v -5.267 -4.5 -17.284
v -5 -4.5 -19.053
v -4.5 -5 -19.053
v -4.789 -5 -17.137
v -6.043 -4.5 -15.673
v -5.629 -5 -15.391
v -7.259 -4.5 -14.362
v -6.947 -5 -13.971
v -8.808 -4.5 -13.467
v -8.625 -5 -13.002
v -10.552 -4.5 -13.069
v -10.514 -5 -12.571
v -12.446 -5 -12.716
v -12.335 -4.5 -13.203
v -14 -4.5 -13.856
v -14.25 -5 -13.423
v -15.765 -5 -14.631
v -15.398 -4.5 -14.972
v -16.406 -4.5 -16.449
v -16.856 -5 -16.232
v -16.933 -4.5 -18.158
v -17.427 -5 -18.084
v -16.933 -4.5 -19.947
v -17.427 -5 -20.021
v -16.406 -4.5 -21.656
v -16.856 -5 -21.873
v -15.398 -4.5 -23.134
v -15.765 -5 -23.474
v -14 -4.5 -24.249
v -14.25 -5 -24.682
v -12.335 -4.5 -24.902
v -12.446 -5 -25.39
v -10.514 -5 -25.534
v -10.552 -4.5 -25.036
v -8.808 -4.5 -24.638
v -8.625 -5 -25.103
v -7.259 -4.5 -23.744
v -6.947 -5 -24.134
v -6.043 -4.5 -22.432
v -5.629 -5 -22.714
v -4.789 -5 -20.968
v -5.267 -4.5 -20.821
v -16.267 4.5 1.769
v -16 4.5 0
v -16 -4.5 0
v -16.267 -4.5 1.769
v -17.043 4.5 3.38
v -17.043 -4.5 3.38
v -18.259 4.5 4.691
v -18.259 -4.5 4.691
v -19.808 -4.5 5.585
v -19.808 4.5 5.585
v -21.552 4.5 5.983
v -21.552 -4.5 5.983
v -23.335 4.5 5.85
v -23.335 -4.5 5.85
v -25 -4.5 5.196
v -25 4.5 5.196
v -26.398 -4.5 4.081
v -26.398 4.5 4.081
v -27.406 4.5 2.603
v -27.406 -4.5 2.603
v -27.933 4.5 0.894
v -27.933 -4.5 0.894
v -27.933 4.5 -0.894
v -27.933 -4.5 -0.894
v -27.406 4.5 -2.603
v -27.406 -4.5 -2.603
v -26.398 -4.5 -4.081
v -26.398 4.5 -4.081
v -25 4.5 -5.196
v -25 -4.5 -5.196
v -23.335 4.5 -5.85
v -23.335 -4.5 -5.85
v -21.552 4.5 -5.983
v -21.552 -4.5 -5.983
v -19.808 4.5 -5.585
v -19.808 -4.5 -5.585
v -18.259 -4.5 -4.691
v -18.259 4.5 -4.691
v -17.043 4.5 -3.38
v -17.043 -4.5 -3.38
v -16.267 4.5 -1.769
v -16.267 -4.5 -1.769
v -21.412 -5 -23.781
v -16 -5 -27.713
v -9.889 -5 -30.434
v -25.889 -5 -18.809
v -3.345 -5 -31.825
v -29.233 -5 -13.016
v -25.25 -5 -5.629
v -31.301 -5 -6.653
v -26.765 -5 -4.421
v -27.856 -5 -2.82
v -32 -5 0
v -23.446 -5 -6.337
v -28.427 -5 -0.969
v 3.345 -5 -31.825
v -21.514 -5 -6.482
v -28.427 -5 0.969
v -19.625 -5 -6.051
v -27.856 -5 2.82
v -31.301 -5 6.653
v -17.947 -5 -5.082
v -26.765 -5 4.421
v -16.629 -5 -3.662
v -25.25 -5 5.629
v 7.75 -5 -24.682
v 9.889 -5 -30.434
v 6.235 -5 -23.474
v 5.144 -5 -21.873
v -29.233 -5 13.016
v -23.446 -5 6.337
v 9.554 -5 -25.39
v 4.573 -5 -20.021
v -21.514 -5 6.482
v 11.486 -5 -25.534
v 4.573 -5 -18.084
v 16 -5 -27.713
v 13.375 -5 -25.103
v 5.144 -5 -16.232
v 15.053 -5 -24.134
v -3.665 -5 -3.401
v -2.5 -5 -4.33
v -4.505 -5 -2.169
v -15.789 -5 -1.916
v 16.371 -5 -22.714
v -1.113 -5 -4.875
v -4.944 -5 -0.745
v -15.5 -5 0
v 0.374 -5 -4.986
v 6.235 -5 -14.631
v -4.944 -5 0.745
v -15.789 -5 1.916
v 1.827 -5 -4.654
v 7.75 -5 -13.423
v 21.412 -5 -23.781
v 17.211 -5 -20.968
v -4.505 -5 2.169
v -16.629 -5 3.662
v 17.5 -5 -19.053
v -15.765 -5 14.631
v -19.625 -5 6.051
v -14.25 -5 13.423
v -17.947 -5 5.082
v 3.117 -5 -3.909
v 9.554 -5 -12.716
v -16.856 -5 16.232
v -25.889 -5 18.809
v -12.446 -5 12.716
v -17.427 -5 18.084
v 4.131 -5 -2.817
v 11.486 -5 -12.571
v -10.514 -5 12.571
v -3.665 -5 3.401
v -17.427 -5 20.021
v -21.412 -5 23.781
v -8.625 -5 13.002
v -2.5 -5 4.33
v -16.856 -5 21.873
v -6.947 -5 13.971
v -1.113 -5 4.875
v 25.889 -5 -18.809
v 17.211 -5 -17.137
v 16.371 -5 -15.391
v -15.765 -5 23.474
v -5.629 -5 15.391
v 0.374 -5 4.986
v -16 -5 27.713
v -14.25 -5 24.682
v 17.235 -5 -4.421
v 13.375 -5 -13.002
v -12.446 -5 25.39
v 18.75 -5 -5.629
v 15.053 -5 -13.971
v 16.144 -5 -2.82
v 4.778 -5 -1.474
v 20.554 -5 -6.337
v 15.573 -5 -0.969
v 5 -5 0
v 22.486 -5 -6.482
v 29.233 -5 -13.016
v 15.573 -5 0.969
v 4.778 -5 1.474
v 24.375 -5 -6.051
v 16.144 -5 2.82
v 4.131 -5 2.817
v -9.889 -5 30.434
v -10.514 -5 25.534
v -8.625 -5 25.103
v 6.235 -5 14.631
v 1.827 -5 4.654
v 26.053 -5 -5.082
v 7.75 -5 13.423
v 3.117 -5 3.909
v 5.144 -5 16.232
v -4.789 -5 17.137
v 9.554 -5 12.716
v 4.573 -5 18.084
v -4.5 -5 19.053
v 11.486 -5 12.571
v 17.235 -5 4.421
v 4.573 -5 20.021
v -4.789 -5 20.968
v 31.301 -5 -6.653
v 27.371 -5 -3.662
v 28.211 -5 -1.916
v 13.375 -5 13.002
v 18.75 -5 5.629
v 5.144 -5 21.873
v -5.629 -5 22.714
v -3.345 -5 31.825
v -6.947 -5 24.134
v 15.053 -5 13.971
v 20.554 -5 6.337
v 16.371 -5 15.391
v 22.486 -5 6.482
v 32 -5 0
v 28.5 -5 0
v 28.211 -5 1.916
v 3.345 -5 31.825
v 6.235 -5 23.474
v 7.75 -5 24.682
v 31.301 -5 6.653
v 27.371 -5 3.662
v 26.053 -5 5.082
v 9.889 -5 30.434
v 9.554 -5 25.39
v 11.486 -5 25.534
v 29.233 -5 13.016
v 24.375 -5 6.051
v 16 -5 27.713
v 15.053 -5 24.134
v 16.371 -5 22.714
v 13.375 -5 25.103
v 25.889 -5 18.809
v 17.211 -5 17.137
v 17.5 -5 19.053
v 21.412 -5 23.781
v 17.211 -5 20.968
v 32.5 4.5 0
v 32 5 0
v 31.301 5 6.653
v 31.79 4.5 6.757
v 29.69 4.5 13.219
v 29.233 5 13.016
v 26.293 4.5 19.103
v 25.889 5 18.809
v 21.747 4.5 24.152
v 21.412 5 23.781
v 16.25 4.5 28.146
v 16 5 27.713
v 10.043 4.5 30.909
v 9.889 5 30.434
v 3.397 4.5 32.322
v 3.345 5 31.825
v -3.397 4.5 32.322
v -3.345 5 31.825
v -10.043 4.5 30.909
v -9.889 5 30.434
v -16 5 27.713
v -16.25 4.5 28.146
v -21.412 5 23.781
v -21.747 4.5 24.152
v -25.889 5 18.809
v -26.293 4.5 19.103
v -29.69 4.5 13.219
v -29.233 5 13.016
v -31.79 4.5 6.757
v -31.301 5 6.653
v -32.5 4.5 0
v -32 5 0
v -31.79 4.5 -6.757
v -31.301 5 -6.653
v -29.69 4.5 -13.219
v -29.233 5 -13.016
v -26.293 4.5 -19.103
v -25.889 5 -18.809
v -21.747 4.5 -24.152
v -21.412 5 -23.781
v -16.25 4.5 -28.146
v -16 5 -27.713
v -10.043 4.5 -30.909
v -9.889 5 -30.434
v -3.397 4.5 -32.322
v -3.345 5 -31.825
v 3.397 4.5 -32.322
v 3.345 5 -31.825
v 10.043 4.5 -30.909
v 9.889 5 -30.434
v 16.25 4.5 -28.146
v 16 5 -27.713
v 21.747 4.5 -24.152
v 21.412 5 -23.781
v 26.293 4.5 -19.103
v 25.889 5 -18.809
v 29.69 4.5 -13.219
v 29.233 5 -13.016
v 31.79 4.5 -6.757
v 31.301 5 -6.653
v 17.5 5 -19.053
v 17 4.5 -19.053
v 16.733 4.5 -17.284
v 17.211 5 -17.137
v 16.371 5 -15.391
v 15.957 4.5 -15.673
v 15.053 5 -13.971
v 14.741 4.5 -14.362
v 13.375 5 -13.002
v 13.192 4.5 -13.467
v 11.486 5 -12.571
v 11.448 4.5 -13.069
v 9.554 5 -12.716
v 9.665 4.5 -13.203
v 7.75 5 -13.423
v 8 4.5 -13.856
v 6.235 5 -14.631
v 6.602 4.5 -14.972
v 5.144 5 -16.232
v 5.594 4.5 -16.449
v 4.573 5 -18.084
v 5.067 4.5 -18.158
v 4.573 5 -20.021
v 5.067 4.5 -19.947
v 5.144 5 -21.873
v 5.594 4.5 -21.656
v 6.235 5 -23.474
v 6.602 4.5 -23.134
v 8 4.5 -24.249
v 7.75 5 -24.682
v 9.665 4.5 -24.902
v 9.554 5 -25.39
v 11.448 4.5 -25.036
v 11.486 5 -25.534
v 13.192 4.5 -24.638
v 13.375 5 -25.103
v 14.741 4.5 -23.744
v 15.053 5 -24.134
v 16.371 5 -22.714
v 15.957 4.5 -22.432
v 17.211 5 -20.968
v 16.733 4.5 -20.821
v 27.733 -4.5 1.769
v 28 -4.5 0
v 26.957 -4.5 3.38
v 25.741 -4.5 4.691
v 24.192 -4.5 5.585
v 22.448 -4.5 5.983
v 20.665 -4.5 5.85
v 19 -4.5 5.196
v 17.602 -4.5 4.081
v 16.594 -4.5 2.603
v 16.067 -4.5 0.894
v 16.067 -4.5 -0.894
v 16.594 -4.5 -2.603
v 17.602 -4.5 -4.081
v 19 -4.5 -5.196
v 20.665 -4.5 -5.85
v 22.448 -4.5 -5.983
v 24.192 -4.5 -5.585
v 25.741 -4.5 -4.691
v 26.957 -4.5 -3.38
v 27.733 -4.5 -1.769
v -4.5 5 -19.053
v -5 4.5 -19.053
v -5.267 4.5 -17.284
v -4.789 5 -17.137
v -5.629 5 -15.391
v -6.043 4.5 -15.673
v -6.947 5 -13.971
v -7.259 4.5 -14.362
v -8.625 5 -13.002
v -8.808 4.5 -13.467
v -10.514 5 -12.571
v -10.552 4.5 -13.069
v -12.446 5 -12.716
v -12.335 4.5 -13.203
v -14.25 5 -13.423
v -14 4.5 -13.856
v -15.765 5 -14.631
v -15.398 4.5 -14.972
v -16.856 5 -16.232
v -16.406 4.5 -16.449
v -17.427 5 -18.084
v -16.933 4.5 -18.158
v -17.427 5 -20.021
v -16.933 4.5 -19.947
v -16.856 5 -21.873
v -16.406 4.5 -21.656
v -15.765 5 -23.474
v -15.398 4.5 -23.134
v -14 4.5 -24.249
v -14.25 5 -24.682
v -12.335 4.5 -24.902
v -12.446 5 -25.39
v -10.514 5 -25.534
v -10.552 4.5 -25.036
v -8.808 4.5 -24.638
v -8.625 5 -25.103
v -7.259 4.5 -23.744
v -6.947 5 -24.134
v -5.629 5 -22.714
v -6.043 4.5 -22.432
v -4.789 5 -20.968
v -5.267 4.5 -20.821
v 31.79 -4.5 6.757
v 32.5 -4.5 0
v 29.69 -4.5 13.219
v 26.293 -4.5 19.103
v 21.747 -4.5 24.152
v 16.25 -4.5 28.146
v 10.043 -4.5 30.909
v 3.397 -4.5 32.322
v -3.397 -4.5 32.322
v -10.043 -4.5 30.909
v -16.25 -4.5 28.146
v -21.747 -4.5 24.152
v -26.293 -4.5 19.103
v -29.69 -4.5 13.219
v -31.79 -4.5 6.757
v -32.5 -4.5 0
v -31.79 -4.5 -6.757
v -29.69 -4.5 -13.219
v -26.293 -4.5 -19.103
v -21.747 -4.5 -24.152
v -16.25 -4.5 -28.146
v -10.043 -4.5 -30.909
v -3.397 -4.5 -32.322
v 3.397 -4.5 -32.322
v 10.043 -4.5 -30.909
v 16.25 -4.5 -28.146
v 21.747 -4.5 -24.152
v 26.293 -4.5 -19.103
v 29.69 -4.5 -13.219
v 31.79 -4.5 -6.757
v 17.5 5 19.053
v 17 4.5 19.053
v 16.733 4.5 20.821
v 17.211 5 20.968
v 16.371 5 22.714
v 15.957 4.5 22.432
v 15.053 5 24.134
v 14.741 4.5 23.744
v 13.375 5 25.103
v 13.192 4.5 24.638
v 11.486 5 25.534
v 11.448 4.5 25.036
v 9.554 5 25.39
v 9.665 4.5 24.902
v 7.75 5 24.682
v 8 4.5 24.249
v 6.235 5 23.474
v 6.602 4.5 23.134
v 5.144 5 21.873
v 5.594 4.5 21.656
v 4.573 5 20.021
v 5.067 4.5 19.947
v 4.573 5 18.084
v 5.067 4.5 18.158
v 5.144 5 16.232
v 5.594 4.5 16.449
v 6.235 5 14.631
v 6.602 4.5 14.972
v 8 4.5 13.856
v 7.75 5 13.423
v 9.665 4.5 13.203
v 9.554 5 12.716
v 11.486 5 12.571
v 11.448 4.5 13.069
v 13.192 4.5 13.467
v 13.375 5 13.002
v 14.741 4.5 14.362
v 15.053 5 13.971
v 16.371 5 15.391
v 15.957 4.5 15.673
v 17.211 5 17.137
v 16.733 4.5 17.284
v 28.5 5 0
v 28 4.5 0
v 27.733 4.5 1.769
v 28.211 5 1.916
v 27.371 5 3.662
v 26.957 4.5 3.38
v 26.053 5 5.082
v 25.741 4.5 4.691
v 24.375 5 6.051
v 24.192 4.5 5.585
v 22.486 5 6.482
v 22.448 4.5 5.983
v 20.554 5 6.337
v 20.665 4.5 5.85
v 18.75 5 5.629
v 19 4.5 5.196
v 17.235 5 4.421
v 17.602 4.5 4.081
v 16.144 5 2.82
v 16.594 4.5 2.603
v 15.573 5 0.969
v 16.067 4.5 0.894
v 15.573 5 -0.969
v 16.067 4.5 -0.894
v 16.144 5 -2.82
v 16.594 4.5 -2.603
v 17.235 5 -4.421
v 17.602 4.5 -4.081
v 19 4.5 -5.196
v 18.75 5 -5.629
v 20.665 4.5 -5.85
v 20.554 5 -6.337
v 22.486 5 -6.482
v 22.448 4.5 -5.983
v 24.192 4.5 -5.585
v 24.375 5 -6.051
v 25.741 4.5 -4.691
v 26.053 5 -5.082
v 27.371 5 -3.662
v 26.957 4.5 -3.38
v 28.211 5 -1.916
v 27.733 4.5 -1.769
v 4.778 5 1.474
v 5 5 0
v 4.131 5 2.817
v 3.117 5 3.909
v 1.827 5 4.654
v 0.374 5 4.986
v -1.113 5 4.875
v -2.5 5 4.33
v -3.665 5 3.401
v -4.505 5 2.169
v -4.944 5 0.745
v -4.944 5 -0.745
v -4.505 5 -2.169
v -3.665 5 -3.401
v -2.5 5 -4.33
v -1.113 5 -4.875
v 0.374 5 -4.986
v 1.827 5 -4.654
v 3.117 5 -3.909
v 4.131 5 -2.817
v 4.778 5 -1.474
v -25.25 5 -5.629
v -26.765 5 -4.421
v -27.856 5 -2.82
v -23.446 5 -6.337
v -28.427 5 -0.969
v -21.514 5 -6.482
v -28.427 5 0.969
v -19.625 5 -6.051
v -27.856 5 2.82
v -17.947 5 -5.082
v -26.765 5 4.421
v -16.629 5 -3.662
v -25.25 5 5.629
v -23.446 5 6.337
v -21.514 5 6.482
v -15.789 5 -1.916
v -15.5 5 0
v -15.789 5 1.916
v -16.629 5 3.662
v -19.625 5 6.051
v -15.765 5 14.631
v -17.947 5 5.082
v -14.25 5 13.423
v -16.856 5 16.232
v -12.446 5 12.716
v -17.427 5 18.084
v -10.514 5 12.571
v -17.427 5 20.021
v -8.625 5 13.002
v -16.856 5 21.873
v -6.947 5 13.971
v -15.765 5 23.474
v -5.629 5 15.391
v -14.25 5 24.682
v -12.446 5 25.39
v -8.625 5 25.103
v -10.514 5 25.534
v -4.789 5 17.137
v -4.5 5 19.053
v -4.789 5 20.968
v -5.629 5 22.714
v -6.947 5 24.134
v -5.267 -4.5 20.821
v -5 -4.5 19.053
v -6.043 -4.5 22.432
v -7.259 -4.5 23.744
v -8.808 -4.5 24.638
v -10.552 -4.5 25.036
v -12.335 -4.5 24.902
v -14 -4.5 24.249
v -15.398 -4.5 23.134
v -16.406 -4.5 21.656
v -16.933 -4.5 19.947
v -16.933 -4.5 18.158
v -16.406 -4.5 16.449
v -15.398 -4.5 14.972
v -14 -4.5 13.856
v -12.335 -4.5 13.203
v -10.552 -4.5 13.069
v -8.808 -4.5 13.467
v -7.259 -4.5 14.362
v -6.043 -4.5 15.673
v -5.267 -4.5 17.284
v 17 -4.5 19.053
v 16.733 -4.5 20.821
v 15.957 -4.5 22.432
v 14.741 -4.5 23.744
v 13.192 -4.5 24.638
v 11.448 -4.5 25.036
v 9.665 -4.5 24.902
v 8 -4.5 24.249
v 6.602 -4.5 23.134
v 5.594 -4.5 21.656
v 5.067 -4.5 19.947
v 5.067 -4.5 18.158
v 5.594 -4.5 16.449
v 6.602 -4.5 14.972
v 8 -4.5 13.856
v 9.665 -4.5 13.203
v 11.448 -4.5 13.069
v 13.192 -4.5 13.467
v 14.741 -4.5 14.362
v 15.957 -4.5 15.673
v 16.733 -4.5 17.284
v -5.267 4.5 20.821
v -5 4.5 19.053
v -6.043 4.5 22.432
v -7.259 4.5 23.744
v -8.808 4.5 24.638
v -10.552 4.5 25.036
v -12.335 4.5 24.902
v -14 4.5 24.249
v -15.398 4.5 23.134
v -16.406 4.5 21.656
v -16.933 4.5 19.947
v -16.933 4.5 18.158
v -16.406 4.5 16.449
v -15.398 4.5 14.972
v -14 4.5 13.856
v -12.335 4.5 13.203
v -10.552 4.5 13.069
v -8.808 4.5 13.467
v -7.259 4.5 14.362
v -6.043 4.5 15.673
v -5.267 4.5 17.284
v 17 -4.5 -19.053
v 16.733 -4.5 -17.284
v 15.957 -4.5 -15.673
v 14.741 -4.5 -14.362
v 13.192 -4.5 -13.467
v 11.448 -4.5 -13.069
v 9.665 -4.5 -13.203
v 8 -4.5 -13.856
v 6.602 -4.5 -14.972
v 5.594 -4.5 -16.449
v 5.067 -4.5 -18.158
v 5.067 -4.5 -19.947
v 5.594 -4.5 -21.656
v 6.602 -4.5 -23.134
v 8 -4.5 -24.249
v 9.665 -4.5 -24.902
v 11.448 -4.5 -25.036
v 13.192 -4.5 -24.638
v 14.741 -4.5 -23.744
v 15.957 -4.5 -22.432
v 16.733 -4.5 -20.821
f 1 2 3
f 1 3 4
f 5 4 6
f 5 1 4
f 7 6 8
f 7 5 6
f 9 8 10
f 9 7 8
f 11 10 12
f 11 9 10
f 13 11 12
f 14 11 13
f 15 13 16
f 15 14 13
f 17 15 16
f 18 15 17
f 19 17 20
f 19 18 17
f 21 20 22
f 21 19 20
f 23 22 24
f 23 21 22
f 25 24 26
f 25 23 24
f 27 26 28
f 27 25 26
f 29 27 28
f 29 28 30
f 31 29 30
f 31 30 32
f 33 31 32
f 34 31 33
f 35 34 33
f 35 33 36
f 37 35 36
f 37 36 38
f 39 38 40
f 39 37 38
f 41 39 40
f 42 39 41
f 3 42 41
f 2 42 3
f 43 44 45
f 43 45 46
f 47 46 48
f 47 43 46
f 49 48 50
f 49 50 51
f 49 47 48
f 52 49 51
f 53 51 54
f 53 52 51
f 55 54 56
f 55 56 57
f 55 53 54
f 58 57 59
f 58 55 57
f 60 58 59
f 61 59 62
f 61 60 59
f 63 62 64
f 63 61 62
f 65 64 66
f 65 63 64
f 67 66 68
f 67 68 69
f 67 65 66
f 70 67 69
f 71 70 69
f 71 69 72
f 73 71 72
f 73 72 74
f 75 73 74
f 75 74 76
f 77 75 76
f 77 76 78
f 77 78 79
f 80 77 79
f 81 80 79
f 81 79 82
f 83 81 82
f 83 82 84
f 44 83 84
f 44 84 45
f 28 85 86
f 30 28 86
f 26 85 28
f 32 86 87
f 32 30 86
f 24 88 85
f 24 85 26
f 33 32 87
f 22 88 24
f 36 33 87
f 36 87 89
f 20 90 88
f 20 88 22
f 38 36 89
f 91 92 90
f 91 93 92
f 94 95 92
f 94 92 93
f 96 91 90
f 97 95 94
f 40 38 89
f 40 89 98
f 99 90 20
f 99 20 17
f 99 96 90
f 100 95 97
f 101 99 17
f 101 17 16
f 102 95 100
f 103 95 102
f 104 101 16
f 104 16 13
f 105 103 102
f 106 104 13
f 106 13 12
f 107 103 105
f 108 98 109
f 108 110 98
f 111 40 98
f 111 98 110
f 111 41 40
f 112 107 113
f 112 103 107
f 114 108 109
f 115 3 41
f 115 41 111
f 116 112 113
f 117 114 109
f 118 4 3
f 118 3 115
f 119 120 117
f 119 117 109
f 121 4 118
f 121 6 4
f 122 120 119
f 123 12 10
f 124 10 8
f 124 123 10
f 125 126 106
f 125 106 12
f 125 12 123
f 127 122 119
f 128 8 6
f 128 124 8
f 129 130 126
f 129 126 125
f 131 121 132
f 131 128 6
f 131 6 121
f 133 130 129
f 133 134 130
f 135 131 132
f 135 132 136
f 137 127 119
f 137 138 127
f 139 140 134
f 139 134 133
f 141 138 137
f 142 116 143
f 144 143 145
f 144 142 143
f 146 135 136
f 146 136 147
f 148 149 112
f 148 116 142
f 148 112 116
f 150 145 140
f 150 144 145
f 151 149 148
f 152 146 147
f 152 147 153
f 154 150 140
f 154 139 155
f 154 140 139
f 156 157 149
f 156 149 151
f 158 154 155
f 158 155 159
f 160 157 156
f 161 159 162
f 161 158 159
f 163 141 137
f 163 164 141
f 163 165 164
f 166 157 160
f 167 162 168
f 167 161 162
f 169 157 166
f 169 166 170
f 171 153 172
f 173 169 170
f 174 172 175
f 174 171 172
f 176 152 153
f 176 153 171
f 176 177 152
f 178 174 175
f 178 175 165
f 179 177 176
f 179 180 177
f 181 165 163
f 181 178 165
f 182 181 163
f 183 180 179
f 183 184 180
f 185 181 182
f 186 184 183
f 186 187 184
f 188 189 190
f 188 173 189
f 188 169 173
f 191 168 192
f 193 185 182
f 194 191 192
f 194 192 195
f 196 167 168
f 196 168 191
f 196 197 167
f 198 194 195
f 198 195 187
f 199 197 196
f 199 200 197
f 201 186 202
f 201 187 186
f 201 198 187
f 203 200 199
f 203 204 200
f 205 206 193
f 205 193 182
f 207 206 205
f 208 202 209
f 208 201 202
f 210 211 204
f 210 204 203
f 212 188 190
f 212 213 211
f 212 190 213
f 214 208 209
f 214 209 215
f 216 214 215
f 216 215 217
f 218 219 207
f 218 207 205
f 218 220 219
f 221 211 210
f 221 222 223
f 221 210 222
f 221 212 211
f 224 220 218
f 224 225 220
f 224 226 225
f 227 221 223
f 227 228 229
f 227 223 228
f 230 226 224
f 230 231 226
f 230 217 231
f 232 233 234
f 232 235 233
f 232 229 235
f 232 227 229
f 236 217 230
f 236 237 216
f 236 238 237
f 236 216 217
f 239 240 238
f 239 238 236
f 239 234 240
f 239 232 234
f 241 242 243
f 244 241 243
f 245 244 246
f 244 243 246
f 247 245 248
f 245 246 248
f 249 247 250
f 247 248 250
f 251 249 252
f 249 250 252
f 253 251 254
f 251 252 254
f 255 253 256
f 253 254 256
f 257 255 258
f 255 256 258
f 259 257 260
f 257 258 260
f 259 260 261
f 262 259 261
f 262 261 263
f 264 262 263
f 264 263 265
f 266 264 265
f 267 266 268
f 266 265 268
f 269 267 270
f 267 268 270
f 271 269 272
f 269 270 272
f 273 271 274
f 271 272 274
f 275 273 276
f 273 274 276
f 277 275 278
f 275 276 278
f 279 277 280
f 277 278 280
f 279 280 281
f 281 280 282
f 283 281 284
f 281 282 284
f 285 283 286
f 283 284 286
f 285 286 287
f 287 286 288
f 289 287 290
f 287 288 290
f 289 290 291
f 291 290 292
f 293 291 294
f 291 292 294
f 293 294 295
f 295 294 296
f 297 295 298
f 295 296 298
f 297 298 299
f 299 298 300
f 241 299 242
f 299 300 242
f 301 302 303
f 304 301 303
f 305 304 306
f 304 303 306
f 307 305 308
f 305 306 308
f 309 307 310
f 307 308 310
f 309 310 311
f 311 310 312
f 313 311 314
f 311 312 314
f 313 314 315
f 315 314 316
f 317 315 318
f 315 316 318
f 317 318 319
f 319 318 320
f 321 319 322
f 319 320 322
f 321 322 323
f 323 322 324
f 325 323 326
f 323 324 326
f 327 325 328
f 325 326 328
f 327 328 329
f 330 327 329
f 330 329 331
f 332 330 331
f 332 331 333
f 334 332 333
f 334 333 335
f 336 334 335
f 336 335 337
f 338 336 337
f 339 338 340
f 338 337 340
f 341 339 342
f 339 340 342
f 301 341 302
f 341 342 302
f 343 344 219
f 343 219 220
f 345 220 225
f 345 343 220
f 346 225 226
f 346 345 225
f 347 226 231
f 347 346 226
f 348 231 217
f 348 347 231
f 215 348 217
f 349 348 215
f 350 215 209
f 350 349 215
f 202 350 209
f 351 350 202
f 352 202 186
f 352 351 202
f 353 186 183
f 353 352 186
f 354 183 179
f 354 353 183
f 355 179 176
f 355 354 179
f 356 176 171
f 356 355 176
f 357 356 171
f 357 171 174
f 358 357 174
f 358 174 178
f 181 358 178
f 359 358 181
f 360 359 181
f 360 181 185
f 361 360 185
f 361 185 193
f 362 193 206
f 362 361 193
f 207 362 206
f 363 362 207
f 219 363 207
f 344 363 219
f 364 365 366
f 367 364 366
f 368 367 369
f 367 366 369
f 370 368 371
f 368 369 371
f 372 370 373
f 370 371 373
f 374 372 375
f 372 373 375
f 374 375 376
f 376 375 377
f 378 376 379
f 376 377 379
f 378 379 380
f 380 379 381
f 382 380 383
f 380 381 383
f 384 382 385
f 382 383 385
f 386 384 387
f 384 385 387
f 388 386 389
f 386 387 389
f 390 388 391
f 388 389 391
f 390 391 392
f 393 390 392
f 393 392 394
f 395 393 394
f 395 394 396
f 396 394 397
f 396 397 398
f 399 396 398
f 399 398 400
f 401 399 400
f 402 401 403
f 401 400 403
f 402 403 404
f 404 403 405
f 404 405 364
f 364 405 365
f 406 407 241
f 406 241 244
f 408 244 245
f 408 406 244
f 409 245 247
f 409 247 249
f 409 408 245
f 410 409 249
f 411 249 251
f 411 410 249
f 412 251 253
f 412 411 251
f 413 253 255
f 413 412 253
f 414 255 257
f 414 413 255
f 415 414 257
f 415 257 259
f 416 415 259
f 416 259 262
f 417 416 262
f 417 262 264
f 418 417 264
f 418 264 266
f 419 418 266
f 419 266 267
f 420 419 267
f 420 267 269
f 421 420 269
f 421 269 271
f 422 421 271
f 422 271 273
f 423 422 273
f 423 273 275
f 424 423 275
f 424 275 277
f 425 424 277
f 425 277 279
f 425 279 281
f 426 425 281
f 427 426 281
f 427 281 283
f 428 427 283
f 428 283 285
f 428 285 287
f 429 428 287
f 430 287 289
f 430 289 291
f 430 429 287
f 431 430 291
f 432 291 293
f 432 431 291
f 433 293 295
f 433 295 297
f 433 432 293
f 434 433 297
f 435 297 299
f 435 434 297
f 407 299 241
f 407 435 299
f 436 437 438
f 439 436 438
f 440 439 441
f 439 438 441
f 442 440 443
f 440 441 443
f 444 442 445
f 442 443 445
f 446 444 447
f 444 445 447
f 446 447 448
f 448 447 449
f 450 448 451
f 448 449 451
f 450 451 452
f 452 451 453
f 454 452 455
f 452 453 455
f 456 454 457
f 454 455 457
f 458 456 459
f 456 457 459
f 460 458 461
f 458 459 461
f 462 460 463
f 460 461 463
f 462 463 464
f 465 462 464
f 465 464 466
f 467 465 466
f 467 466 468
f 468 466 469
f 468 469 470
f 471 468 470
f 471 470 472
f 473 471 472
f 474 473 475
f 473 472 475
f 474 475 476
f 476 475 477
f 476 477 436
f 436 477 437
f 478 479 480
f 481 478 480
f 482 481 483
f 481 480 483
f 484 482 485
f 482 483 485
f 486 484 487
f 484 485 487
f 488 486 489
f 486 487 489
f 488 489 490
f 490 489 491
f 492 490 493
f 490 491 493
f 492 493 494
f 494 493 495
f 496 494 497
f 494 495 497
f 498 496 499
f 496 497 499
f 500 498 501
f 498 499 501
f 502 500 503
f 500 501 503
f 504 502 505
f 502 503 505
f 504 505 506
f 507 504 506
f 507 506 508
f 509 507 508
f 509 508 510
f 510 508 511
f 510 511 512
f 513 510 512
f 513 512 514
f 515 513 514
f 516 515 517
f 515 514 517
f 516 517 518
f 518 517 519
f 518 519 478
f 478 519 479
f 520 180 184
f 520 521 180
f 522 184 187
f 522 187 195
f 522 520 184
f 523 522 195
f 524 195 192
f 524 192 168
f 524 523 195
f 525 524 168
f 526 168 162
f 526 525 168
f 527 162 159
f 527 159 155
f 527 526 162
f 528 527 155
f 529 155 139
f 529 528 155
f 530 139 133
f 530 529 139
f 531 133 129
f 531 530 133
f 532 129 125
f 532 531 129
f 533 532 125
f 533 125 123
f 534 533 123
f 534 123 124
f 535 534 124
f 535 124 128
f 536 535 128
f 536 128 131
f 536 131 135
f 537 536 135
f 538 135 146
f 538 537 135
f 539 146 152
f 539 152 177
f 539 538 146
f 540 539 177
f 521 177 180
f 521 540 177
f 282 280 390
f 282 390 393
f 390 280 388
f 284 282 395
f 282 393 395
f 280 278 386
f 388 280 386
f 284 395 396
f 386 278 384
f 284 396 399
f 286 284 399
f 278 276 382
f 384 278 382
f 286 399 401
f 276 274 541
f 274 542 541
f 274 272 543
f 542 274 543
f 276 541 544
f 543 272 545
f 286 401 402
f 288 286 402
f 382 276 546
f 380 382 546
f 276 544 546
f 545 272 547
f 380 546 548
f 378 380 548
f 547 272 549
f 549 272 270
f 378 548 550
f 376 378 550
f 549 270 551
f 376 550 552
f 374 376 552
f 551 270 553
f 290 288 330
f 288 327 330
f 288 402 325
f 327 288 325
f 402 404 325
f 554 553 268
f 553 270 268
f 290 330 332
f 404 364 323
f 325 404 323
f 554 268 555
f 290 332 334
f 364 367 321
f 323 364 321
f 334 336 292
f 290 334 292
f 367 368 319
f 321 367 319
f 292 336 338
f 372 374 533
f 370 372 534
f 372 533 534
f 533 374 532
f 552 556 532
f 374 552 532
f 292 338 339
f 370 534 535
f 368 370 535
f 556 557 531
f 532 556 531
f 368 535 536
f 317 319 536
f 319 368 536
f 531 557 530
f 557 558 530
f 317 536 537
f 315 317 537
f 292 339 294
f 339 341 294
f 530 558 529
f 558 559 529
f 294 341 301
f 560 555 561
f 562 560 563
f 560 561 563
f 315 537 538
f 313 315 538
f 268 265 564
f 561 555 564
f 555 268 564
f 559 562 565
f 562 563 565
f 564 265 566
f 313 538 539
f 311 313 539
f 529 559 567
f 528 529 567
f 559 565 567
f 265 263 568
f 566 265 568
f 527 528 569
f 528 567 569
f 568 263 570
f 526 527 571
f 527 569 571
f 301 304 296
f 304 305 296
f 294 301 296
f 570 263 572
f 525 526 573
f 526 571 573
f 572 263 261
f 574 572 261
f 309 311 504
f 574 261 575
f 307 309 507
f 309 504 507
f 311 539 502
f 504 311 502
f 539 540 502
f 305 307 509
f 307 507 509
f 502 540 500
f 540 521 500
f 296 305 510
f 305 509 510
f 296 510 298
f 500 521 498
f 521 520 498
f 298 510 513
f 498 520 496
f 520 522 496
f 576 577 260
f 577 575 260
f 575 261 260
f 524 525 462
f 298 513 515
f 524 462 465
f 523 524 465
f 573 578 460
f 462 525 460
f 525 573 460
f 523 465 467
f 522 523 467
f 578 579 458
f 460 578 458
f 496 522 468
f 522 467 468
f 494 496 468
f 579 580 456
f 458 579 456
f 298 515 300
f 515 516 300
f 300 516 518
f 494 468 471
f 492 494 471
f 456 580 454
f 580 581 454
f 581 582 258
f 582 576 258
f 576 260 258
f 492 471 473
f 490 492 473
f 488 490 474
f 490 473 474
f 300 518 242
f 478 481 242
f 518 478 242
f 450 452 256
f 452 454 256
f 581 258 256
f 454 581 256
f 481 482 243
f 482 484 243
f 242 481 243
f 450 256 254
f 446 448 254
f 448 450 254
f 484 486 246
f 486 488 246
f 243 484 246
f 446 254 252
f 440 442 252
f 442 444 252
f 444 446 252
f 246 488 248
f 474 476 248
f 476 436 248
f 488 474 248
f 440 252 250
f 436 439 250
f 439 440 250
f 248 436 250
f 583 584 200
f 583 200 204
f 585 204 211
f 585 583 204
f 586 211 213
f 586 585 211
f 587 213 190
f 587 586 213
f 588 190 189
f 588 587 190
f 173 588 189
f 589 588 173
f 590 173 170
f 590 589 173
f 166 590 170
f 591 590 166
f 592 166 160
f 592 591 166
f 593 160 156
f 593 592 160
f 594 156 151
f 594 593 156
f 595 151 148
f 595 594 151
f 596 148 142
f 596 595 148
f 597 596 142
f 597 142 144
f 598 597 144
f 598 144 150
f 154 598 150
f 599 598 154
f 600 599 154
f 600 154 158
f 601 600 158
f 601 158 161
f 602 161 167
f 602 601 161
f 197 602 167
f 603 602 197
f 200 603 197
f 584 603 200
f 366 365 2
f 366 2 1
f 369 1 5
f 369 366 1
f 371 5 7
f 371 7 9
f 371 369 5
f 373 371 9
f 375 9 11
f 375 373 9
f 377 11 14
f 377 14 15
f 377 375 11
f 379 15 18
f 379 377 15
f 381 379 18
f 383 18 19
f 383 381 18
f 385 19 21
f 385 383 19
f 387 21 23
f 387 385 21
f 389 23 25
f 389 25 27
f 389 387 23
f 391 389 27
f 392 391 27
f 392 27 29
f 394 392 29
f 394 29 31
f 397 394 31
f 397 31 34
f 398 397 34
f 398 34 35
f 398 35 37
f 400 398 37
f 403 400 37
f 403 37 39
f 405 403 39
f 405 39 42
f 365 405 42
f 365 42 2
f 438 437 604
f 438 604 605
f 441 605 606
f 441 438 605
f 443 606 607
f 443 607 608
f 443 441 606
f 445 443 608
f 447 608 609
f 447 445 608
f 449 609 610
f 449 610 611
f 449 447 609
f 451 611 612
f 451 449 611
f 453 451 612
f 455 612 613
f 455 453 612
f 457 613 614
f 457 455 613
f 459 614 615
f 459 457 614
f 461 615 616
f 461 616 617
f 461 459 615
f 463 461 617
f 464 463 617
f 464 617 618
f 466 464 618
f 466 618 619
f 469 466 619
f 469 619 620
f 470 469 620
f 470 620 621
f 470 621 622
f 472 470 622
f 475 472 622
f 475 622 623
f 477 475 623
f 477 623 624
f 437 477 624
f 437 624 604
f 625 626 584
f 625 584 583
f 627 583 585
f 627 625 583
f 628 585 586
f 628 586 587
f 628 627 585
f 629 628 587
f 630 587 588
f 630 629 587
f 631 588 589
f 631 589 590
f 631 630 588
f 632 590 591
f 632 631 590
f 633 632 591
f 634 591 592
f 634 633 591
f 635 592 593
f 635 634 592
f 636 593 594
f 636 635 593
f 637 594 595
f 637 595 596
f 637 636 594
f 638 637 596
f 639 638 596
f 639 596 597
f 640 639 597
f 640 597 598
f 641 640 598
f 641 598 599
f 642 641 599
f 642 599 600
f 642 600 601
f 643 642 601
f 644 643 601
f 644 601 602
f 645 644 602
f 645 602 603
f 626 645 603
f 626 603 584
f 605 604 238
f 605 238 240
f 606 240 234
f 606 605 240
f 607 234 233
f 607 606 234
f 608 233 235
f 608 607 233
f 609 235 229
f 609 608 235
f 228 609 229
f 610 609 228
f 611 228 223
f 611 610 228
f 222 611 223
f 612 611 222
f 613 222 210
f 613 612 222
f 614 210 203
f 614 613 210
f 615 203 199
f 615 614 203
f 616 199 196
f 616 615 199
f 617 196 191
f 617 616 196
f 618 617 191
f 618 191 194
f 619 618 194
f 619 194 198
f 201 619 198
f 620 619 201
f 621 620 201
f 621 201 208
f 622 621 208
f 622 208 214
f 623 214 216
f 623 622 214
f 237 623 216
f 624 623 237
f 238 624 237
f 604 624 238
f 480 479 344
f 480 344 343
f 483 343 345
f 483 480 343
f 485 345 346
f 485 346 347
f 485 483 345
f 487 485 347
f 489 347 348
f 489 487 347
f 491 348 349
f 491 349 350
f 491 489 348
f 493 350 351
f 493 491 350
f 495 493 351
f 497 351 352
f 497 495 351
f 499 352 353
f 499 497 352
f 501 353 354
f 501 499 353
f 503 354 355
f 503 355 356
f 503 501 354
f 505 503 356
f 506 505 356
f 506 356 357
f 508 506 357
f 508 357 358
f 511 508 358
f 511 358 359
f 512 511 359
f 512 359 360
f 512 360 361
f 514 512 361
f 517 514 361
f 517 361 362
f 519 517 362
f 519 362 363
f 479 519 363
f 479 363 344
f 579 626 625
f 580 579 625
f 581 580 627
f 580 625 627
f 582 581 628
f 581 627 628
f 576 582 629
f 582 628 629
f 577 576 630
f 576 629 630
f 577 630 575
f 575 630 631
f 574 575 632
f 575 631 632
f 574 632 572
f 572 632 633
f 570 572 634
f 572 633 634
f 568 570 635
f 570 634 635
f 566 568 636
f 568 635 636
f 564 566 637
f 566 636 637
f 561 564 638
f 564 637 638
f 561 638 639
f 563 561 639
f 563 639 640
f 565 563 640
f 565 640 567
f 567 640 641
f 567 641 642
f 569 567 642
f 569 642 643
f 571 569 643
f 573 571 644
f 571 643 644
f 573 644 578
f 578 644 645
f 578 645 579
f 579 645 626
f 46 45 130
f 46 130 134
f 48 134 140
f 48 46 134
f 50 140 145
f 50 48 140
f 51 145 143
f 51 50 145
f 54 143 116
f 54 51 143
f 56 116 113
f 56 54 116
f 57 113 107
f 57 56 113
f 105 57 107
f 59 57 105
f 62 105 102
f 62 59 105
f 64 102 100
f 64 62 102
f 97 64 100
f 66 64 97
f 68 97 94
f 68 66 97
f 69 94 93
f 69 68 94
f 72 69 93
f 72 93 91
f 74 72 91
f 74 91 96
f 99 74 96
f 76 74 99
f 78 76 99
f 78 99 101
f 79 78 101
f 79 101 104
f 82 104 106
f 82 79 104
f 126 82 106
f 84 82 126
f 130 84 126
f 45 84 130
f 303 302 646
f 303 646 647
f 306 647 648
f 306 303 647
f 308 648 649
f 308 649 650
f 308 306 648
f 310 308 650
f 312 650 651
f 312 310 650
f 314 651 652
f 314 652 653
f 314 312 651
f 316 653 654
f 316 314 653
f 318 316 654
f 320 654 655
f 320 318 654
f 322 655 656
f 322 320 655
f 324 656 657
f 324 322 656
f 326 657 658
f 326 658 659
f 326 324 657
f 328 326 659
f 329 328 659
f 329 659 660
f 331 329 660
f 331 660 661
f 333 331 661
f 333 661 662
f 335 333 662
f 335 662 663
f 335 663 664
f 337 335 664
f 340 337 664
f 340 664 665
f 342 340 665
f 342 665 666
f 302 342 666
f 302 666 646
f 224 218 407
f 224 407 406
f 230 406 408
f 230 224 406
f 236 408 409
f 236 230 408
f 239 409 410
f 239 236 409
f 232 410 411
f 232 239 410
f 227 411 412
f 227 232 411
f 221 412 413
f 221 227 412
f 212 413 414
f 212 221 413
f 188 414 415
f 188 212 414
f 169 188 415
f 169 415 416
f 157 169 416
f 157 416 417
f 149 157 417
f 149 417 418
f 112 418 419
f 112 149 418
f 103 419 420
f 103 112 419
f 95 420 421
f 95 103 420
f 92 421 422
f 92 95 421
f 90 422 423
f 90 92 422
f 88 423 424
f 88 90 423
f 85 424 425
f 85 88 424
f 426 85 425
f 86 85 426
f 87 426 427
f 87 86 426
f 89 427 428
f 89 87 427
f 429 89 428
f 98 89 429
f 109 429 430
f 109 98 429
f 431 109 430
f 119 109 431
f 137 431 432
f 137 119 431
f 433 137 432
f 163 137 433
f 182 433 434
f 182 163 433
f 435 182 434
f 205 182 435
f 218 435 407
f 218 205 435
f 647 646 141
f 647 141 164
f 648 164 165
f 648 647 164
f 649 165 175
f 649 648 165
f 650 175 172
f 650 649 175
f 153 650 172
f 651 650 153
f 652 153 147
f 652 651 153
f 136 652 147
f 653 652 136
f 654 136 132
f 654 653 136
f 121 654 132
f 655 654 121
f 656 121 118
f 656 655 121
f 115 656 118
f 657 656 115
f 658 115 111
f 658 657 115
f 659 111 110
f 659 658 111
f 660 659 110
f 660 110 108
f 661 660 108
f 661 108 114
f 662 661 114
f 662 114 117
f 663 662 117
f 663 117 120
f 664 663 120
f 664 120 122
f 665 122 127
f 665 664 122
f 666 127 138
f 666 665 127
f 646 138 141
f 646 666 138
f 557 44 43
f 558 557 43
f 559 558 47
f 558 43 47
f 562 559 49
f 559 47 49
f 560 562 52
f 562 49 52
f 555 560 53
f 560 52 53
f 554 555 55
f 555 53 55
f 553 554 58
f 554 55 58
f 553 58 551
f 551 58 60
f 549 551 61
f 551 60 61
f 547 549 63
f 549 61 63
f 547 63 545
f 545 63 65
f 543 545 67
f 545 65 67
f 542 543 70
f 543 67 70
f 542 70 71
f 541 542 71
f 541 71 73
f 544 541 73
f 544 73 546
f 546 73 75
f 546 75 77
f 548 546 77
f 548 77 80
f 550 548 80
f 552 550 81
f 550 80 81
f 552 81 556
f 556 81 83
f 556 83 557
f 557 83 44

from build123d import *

# Parameters (mm, degrees)
F0_R     = 32.5
F0_R_2   = 6
F0_R_3   = 5
F1_DEPTH = 5
F2_SIZE  = 0.5
F3_SIZE  = 0.5
F4_SIZE  = 0.5


with BuildPart() as f1:
    # F0 (on Front) → F1 (new body, symmetric)
    with BuildSketch(Plane.XZ):
        Circle(F0_R)
        with Locations((-11, -19.052559)):
            Circle(F0_R_2, mode=Mode.SUBTRACT)
        with Locations((11, -19.052559)):
            Circle(F0_R_2, mode=Mode.SUBTRACT)
        with Locations((-22, 0)):
            Circle(F0_R_2, mode=Mode.SUBTRACT)
        with Locations((-11, 19.052559)):
            Circle(F0_R_2, mode=Mode.SUBTRACT)
        Circle(F0_R_3, mode=Mode.SUBTRACT)
        with Locations((22, 0)):
            Circle(F0_R_2, mode=Mode.SUBTRACT)
        with Locations((11, 19.052559)):
            Circle(F0_R_2, mode=Mode.SUBTRACT)
    extrude(amount=F1_DEPTH, both=True)

    # F2
    f2_edges = [f1.edges().sort_by_distance(p)[0] for p in [
        (-32.5, -5, 0),
    ]]
    chamfer(f2_edges, length=F2_SIZE)

    # F3
    f3_edges = [f1.edges().sort_by_distance(p)[0] for p in [
        (5, 5, -19.052559),
        (5, -5, -19.052559),
        (16, 5, 0),
        (5, 5, 19.052559),
        (-32.5, 5, 0),
        (-17, 5, 19.052559),
        (-28, 5, 0),
        (-17, 5, -19.052559),
        (16, -5, 0),
        (5, -5, 19.052559),
        (-17, -5, 19.052559),
        (-17, -5, -19.052559),
    ]]
    chamfer(f3_edges, length=F3_SIZE)

    # F4
    f4_edges = [f1.edges().sort_by_distance(p)[0] for p in [
        (-28, -5, 0),
    ]]
    chamfer(f4_edges, length=F4_SIZE)


solid = f1.part
